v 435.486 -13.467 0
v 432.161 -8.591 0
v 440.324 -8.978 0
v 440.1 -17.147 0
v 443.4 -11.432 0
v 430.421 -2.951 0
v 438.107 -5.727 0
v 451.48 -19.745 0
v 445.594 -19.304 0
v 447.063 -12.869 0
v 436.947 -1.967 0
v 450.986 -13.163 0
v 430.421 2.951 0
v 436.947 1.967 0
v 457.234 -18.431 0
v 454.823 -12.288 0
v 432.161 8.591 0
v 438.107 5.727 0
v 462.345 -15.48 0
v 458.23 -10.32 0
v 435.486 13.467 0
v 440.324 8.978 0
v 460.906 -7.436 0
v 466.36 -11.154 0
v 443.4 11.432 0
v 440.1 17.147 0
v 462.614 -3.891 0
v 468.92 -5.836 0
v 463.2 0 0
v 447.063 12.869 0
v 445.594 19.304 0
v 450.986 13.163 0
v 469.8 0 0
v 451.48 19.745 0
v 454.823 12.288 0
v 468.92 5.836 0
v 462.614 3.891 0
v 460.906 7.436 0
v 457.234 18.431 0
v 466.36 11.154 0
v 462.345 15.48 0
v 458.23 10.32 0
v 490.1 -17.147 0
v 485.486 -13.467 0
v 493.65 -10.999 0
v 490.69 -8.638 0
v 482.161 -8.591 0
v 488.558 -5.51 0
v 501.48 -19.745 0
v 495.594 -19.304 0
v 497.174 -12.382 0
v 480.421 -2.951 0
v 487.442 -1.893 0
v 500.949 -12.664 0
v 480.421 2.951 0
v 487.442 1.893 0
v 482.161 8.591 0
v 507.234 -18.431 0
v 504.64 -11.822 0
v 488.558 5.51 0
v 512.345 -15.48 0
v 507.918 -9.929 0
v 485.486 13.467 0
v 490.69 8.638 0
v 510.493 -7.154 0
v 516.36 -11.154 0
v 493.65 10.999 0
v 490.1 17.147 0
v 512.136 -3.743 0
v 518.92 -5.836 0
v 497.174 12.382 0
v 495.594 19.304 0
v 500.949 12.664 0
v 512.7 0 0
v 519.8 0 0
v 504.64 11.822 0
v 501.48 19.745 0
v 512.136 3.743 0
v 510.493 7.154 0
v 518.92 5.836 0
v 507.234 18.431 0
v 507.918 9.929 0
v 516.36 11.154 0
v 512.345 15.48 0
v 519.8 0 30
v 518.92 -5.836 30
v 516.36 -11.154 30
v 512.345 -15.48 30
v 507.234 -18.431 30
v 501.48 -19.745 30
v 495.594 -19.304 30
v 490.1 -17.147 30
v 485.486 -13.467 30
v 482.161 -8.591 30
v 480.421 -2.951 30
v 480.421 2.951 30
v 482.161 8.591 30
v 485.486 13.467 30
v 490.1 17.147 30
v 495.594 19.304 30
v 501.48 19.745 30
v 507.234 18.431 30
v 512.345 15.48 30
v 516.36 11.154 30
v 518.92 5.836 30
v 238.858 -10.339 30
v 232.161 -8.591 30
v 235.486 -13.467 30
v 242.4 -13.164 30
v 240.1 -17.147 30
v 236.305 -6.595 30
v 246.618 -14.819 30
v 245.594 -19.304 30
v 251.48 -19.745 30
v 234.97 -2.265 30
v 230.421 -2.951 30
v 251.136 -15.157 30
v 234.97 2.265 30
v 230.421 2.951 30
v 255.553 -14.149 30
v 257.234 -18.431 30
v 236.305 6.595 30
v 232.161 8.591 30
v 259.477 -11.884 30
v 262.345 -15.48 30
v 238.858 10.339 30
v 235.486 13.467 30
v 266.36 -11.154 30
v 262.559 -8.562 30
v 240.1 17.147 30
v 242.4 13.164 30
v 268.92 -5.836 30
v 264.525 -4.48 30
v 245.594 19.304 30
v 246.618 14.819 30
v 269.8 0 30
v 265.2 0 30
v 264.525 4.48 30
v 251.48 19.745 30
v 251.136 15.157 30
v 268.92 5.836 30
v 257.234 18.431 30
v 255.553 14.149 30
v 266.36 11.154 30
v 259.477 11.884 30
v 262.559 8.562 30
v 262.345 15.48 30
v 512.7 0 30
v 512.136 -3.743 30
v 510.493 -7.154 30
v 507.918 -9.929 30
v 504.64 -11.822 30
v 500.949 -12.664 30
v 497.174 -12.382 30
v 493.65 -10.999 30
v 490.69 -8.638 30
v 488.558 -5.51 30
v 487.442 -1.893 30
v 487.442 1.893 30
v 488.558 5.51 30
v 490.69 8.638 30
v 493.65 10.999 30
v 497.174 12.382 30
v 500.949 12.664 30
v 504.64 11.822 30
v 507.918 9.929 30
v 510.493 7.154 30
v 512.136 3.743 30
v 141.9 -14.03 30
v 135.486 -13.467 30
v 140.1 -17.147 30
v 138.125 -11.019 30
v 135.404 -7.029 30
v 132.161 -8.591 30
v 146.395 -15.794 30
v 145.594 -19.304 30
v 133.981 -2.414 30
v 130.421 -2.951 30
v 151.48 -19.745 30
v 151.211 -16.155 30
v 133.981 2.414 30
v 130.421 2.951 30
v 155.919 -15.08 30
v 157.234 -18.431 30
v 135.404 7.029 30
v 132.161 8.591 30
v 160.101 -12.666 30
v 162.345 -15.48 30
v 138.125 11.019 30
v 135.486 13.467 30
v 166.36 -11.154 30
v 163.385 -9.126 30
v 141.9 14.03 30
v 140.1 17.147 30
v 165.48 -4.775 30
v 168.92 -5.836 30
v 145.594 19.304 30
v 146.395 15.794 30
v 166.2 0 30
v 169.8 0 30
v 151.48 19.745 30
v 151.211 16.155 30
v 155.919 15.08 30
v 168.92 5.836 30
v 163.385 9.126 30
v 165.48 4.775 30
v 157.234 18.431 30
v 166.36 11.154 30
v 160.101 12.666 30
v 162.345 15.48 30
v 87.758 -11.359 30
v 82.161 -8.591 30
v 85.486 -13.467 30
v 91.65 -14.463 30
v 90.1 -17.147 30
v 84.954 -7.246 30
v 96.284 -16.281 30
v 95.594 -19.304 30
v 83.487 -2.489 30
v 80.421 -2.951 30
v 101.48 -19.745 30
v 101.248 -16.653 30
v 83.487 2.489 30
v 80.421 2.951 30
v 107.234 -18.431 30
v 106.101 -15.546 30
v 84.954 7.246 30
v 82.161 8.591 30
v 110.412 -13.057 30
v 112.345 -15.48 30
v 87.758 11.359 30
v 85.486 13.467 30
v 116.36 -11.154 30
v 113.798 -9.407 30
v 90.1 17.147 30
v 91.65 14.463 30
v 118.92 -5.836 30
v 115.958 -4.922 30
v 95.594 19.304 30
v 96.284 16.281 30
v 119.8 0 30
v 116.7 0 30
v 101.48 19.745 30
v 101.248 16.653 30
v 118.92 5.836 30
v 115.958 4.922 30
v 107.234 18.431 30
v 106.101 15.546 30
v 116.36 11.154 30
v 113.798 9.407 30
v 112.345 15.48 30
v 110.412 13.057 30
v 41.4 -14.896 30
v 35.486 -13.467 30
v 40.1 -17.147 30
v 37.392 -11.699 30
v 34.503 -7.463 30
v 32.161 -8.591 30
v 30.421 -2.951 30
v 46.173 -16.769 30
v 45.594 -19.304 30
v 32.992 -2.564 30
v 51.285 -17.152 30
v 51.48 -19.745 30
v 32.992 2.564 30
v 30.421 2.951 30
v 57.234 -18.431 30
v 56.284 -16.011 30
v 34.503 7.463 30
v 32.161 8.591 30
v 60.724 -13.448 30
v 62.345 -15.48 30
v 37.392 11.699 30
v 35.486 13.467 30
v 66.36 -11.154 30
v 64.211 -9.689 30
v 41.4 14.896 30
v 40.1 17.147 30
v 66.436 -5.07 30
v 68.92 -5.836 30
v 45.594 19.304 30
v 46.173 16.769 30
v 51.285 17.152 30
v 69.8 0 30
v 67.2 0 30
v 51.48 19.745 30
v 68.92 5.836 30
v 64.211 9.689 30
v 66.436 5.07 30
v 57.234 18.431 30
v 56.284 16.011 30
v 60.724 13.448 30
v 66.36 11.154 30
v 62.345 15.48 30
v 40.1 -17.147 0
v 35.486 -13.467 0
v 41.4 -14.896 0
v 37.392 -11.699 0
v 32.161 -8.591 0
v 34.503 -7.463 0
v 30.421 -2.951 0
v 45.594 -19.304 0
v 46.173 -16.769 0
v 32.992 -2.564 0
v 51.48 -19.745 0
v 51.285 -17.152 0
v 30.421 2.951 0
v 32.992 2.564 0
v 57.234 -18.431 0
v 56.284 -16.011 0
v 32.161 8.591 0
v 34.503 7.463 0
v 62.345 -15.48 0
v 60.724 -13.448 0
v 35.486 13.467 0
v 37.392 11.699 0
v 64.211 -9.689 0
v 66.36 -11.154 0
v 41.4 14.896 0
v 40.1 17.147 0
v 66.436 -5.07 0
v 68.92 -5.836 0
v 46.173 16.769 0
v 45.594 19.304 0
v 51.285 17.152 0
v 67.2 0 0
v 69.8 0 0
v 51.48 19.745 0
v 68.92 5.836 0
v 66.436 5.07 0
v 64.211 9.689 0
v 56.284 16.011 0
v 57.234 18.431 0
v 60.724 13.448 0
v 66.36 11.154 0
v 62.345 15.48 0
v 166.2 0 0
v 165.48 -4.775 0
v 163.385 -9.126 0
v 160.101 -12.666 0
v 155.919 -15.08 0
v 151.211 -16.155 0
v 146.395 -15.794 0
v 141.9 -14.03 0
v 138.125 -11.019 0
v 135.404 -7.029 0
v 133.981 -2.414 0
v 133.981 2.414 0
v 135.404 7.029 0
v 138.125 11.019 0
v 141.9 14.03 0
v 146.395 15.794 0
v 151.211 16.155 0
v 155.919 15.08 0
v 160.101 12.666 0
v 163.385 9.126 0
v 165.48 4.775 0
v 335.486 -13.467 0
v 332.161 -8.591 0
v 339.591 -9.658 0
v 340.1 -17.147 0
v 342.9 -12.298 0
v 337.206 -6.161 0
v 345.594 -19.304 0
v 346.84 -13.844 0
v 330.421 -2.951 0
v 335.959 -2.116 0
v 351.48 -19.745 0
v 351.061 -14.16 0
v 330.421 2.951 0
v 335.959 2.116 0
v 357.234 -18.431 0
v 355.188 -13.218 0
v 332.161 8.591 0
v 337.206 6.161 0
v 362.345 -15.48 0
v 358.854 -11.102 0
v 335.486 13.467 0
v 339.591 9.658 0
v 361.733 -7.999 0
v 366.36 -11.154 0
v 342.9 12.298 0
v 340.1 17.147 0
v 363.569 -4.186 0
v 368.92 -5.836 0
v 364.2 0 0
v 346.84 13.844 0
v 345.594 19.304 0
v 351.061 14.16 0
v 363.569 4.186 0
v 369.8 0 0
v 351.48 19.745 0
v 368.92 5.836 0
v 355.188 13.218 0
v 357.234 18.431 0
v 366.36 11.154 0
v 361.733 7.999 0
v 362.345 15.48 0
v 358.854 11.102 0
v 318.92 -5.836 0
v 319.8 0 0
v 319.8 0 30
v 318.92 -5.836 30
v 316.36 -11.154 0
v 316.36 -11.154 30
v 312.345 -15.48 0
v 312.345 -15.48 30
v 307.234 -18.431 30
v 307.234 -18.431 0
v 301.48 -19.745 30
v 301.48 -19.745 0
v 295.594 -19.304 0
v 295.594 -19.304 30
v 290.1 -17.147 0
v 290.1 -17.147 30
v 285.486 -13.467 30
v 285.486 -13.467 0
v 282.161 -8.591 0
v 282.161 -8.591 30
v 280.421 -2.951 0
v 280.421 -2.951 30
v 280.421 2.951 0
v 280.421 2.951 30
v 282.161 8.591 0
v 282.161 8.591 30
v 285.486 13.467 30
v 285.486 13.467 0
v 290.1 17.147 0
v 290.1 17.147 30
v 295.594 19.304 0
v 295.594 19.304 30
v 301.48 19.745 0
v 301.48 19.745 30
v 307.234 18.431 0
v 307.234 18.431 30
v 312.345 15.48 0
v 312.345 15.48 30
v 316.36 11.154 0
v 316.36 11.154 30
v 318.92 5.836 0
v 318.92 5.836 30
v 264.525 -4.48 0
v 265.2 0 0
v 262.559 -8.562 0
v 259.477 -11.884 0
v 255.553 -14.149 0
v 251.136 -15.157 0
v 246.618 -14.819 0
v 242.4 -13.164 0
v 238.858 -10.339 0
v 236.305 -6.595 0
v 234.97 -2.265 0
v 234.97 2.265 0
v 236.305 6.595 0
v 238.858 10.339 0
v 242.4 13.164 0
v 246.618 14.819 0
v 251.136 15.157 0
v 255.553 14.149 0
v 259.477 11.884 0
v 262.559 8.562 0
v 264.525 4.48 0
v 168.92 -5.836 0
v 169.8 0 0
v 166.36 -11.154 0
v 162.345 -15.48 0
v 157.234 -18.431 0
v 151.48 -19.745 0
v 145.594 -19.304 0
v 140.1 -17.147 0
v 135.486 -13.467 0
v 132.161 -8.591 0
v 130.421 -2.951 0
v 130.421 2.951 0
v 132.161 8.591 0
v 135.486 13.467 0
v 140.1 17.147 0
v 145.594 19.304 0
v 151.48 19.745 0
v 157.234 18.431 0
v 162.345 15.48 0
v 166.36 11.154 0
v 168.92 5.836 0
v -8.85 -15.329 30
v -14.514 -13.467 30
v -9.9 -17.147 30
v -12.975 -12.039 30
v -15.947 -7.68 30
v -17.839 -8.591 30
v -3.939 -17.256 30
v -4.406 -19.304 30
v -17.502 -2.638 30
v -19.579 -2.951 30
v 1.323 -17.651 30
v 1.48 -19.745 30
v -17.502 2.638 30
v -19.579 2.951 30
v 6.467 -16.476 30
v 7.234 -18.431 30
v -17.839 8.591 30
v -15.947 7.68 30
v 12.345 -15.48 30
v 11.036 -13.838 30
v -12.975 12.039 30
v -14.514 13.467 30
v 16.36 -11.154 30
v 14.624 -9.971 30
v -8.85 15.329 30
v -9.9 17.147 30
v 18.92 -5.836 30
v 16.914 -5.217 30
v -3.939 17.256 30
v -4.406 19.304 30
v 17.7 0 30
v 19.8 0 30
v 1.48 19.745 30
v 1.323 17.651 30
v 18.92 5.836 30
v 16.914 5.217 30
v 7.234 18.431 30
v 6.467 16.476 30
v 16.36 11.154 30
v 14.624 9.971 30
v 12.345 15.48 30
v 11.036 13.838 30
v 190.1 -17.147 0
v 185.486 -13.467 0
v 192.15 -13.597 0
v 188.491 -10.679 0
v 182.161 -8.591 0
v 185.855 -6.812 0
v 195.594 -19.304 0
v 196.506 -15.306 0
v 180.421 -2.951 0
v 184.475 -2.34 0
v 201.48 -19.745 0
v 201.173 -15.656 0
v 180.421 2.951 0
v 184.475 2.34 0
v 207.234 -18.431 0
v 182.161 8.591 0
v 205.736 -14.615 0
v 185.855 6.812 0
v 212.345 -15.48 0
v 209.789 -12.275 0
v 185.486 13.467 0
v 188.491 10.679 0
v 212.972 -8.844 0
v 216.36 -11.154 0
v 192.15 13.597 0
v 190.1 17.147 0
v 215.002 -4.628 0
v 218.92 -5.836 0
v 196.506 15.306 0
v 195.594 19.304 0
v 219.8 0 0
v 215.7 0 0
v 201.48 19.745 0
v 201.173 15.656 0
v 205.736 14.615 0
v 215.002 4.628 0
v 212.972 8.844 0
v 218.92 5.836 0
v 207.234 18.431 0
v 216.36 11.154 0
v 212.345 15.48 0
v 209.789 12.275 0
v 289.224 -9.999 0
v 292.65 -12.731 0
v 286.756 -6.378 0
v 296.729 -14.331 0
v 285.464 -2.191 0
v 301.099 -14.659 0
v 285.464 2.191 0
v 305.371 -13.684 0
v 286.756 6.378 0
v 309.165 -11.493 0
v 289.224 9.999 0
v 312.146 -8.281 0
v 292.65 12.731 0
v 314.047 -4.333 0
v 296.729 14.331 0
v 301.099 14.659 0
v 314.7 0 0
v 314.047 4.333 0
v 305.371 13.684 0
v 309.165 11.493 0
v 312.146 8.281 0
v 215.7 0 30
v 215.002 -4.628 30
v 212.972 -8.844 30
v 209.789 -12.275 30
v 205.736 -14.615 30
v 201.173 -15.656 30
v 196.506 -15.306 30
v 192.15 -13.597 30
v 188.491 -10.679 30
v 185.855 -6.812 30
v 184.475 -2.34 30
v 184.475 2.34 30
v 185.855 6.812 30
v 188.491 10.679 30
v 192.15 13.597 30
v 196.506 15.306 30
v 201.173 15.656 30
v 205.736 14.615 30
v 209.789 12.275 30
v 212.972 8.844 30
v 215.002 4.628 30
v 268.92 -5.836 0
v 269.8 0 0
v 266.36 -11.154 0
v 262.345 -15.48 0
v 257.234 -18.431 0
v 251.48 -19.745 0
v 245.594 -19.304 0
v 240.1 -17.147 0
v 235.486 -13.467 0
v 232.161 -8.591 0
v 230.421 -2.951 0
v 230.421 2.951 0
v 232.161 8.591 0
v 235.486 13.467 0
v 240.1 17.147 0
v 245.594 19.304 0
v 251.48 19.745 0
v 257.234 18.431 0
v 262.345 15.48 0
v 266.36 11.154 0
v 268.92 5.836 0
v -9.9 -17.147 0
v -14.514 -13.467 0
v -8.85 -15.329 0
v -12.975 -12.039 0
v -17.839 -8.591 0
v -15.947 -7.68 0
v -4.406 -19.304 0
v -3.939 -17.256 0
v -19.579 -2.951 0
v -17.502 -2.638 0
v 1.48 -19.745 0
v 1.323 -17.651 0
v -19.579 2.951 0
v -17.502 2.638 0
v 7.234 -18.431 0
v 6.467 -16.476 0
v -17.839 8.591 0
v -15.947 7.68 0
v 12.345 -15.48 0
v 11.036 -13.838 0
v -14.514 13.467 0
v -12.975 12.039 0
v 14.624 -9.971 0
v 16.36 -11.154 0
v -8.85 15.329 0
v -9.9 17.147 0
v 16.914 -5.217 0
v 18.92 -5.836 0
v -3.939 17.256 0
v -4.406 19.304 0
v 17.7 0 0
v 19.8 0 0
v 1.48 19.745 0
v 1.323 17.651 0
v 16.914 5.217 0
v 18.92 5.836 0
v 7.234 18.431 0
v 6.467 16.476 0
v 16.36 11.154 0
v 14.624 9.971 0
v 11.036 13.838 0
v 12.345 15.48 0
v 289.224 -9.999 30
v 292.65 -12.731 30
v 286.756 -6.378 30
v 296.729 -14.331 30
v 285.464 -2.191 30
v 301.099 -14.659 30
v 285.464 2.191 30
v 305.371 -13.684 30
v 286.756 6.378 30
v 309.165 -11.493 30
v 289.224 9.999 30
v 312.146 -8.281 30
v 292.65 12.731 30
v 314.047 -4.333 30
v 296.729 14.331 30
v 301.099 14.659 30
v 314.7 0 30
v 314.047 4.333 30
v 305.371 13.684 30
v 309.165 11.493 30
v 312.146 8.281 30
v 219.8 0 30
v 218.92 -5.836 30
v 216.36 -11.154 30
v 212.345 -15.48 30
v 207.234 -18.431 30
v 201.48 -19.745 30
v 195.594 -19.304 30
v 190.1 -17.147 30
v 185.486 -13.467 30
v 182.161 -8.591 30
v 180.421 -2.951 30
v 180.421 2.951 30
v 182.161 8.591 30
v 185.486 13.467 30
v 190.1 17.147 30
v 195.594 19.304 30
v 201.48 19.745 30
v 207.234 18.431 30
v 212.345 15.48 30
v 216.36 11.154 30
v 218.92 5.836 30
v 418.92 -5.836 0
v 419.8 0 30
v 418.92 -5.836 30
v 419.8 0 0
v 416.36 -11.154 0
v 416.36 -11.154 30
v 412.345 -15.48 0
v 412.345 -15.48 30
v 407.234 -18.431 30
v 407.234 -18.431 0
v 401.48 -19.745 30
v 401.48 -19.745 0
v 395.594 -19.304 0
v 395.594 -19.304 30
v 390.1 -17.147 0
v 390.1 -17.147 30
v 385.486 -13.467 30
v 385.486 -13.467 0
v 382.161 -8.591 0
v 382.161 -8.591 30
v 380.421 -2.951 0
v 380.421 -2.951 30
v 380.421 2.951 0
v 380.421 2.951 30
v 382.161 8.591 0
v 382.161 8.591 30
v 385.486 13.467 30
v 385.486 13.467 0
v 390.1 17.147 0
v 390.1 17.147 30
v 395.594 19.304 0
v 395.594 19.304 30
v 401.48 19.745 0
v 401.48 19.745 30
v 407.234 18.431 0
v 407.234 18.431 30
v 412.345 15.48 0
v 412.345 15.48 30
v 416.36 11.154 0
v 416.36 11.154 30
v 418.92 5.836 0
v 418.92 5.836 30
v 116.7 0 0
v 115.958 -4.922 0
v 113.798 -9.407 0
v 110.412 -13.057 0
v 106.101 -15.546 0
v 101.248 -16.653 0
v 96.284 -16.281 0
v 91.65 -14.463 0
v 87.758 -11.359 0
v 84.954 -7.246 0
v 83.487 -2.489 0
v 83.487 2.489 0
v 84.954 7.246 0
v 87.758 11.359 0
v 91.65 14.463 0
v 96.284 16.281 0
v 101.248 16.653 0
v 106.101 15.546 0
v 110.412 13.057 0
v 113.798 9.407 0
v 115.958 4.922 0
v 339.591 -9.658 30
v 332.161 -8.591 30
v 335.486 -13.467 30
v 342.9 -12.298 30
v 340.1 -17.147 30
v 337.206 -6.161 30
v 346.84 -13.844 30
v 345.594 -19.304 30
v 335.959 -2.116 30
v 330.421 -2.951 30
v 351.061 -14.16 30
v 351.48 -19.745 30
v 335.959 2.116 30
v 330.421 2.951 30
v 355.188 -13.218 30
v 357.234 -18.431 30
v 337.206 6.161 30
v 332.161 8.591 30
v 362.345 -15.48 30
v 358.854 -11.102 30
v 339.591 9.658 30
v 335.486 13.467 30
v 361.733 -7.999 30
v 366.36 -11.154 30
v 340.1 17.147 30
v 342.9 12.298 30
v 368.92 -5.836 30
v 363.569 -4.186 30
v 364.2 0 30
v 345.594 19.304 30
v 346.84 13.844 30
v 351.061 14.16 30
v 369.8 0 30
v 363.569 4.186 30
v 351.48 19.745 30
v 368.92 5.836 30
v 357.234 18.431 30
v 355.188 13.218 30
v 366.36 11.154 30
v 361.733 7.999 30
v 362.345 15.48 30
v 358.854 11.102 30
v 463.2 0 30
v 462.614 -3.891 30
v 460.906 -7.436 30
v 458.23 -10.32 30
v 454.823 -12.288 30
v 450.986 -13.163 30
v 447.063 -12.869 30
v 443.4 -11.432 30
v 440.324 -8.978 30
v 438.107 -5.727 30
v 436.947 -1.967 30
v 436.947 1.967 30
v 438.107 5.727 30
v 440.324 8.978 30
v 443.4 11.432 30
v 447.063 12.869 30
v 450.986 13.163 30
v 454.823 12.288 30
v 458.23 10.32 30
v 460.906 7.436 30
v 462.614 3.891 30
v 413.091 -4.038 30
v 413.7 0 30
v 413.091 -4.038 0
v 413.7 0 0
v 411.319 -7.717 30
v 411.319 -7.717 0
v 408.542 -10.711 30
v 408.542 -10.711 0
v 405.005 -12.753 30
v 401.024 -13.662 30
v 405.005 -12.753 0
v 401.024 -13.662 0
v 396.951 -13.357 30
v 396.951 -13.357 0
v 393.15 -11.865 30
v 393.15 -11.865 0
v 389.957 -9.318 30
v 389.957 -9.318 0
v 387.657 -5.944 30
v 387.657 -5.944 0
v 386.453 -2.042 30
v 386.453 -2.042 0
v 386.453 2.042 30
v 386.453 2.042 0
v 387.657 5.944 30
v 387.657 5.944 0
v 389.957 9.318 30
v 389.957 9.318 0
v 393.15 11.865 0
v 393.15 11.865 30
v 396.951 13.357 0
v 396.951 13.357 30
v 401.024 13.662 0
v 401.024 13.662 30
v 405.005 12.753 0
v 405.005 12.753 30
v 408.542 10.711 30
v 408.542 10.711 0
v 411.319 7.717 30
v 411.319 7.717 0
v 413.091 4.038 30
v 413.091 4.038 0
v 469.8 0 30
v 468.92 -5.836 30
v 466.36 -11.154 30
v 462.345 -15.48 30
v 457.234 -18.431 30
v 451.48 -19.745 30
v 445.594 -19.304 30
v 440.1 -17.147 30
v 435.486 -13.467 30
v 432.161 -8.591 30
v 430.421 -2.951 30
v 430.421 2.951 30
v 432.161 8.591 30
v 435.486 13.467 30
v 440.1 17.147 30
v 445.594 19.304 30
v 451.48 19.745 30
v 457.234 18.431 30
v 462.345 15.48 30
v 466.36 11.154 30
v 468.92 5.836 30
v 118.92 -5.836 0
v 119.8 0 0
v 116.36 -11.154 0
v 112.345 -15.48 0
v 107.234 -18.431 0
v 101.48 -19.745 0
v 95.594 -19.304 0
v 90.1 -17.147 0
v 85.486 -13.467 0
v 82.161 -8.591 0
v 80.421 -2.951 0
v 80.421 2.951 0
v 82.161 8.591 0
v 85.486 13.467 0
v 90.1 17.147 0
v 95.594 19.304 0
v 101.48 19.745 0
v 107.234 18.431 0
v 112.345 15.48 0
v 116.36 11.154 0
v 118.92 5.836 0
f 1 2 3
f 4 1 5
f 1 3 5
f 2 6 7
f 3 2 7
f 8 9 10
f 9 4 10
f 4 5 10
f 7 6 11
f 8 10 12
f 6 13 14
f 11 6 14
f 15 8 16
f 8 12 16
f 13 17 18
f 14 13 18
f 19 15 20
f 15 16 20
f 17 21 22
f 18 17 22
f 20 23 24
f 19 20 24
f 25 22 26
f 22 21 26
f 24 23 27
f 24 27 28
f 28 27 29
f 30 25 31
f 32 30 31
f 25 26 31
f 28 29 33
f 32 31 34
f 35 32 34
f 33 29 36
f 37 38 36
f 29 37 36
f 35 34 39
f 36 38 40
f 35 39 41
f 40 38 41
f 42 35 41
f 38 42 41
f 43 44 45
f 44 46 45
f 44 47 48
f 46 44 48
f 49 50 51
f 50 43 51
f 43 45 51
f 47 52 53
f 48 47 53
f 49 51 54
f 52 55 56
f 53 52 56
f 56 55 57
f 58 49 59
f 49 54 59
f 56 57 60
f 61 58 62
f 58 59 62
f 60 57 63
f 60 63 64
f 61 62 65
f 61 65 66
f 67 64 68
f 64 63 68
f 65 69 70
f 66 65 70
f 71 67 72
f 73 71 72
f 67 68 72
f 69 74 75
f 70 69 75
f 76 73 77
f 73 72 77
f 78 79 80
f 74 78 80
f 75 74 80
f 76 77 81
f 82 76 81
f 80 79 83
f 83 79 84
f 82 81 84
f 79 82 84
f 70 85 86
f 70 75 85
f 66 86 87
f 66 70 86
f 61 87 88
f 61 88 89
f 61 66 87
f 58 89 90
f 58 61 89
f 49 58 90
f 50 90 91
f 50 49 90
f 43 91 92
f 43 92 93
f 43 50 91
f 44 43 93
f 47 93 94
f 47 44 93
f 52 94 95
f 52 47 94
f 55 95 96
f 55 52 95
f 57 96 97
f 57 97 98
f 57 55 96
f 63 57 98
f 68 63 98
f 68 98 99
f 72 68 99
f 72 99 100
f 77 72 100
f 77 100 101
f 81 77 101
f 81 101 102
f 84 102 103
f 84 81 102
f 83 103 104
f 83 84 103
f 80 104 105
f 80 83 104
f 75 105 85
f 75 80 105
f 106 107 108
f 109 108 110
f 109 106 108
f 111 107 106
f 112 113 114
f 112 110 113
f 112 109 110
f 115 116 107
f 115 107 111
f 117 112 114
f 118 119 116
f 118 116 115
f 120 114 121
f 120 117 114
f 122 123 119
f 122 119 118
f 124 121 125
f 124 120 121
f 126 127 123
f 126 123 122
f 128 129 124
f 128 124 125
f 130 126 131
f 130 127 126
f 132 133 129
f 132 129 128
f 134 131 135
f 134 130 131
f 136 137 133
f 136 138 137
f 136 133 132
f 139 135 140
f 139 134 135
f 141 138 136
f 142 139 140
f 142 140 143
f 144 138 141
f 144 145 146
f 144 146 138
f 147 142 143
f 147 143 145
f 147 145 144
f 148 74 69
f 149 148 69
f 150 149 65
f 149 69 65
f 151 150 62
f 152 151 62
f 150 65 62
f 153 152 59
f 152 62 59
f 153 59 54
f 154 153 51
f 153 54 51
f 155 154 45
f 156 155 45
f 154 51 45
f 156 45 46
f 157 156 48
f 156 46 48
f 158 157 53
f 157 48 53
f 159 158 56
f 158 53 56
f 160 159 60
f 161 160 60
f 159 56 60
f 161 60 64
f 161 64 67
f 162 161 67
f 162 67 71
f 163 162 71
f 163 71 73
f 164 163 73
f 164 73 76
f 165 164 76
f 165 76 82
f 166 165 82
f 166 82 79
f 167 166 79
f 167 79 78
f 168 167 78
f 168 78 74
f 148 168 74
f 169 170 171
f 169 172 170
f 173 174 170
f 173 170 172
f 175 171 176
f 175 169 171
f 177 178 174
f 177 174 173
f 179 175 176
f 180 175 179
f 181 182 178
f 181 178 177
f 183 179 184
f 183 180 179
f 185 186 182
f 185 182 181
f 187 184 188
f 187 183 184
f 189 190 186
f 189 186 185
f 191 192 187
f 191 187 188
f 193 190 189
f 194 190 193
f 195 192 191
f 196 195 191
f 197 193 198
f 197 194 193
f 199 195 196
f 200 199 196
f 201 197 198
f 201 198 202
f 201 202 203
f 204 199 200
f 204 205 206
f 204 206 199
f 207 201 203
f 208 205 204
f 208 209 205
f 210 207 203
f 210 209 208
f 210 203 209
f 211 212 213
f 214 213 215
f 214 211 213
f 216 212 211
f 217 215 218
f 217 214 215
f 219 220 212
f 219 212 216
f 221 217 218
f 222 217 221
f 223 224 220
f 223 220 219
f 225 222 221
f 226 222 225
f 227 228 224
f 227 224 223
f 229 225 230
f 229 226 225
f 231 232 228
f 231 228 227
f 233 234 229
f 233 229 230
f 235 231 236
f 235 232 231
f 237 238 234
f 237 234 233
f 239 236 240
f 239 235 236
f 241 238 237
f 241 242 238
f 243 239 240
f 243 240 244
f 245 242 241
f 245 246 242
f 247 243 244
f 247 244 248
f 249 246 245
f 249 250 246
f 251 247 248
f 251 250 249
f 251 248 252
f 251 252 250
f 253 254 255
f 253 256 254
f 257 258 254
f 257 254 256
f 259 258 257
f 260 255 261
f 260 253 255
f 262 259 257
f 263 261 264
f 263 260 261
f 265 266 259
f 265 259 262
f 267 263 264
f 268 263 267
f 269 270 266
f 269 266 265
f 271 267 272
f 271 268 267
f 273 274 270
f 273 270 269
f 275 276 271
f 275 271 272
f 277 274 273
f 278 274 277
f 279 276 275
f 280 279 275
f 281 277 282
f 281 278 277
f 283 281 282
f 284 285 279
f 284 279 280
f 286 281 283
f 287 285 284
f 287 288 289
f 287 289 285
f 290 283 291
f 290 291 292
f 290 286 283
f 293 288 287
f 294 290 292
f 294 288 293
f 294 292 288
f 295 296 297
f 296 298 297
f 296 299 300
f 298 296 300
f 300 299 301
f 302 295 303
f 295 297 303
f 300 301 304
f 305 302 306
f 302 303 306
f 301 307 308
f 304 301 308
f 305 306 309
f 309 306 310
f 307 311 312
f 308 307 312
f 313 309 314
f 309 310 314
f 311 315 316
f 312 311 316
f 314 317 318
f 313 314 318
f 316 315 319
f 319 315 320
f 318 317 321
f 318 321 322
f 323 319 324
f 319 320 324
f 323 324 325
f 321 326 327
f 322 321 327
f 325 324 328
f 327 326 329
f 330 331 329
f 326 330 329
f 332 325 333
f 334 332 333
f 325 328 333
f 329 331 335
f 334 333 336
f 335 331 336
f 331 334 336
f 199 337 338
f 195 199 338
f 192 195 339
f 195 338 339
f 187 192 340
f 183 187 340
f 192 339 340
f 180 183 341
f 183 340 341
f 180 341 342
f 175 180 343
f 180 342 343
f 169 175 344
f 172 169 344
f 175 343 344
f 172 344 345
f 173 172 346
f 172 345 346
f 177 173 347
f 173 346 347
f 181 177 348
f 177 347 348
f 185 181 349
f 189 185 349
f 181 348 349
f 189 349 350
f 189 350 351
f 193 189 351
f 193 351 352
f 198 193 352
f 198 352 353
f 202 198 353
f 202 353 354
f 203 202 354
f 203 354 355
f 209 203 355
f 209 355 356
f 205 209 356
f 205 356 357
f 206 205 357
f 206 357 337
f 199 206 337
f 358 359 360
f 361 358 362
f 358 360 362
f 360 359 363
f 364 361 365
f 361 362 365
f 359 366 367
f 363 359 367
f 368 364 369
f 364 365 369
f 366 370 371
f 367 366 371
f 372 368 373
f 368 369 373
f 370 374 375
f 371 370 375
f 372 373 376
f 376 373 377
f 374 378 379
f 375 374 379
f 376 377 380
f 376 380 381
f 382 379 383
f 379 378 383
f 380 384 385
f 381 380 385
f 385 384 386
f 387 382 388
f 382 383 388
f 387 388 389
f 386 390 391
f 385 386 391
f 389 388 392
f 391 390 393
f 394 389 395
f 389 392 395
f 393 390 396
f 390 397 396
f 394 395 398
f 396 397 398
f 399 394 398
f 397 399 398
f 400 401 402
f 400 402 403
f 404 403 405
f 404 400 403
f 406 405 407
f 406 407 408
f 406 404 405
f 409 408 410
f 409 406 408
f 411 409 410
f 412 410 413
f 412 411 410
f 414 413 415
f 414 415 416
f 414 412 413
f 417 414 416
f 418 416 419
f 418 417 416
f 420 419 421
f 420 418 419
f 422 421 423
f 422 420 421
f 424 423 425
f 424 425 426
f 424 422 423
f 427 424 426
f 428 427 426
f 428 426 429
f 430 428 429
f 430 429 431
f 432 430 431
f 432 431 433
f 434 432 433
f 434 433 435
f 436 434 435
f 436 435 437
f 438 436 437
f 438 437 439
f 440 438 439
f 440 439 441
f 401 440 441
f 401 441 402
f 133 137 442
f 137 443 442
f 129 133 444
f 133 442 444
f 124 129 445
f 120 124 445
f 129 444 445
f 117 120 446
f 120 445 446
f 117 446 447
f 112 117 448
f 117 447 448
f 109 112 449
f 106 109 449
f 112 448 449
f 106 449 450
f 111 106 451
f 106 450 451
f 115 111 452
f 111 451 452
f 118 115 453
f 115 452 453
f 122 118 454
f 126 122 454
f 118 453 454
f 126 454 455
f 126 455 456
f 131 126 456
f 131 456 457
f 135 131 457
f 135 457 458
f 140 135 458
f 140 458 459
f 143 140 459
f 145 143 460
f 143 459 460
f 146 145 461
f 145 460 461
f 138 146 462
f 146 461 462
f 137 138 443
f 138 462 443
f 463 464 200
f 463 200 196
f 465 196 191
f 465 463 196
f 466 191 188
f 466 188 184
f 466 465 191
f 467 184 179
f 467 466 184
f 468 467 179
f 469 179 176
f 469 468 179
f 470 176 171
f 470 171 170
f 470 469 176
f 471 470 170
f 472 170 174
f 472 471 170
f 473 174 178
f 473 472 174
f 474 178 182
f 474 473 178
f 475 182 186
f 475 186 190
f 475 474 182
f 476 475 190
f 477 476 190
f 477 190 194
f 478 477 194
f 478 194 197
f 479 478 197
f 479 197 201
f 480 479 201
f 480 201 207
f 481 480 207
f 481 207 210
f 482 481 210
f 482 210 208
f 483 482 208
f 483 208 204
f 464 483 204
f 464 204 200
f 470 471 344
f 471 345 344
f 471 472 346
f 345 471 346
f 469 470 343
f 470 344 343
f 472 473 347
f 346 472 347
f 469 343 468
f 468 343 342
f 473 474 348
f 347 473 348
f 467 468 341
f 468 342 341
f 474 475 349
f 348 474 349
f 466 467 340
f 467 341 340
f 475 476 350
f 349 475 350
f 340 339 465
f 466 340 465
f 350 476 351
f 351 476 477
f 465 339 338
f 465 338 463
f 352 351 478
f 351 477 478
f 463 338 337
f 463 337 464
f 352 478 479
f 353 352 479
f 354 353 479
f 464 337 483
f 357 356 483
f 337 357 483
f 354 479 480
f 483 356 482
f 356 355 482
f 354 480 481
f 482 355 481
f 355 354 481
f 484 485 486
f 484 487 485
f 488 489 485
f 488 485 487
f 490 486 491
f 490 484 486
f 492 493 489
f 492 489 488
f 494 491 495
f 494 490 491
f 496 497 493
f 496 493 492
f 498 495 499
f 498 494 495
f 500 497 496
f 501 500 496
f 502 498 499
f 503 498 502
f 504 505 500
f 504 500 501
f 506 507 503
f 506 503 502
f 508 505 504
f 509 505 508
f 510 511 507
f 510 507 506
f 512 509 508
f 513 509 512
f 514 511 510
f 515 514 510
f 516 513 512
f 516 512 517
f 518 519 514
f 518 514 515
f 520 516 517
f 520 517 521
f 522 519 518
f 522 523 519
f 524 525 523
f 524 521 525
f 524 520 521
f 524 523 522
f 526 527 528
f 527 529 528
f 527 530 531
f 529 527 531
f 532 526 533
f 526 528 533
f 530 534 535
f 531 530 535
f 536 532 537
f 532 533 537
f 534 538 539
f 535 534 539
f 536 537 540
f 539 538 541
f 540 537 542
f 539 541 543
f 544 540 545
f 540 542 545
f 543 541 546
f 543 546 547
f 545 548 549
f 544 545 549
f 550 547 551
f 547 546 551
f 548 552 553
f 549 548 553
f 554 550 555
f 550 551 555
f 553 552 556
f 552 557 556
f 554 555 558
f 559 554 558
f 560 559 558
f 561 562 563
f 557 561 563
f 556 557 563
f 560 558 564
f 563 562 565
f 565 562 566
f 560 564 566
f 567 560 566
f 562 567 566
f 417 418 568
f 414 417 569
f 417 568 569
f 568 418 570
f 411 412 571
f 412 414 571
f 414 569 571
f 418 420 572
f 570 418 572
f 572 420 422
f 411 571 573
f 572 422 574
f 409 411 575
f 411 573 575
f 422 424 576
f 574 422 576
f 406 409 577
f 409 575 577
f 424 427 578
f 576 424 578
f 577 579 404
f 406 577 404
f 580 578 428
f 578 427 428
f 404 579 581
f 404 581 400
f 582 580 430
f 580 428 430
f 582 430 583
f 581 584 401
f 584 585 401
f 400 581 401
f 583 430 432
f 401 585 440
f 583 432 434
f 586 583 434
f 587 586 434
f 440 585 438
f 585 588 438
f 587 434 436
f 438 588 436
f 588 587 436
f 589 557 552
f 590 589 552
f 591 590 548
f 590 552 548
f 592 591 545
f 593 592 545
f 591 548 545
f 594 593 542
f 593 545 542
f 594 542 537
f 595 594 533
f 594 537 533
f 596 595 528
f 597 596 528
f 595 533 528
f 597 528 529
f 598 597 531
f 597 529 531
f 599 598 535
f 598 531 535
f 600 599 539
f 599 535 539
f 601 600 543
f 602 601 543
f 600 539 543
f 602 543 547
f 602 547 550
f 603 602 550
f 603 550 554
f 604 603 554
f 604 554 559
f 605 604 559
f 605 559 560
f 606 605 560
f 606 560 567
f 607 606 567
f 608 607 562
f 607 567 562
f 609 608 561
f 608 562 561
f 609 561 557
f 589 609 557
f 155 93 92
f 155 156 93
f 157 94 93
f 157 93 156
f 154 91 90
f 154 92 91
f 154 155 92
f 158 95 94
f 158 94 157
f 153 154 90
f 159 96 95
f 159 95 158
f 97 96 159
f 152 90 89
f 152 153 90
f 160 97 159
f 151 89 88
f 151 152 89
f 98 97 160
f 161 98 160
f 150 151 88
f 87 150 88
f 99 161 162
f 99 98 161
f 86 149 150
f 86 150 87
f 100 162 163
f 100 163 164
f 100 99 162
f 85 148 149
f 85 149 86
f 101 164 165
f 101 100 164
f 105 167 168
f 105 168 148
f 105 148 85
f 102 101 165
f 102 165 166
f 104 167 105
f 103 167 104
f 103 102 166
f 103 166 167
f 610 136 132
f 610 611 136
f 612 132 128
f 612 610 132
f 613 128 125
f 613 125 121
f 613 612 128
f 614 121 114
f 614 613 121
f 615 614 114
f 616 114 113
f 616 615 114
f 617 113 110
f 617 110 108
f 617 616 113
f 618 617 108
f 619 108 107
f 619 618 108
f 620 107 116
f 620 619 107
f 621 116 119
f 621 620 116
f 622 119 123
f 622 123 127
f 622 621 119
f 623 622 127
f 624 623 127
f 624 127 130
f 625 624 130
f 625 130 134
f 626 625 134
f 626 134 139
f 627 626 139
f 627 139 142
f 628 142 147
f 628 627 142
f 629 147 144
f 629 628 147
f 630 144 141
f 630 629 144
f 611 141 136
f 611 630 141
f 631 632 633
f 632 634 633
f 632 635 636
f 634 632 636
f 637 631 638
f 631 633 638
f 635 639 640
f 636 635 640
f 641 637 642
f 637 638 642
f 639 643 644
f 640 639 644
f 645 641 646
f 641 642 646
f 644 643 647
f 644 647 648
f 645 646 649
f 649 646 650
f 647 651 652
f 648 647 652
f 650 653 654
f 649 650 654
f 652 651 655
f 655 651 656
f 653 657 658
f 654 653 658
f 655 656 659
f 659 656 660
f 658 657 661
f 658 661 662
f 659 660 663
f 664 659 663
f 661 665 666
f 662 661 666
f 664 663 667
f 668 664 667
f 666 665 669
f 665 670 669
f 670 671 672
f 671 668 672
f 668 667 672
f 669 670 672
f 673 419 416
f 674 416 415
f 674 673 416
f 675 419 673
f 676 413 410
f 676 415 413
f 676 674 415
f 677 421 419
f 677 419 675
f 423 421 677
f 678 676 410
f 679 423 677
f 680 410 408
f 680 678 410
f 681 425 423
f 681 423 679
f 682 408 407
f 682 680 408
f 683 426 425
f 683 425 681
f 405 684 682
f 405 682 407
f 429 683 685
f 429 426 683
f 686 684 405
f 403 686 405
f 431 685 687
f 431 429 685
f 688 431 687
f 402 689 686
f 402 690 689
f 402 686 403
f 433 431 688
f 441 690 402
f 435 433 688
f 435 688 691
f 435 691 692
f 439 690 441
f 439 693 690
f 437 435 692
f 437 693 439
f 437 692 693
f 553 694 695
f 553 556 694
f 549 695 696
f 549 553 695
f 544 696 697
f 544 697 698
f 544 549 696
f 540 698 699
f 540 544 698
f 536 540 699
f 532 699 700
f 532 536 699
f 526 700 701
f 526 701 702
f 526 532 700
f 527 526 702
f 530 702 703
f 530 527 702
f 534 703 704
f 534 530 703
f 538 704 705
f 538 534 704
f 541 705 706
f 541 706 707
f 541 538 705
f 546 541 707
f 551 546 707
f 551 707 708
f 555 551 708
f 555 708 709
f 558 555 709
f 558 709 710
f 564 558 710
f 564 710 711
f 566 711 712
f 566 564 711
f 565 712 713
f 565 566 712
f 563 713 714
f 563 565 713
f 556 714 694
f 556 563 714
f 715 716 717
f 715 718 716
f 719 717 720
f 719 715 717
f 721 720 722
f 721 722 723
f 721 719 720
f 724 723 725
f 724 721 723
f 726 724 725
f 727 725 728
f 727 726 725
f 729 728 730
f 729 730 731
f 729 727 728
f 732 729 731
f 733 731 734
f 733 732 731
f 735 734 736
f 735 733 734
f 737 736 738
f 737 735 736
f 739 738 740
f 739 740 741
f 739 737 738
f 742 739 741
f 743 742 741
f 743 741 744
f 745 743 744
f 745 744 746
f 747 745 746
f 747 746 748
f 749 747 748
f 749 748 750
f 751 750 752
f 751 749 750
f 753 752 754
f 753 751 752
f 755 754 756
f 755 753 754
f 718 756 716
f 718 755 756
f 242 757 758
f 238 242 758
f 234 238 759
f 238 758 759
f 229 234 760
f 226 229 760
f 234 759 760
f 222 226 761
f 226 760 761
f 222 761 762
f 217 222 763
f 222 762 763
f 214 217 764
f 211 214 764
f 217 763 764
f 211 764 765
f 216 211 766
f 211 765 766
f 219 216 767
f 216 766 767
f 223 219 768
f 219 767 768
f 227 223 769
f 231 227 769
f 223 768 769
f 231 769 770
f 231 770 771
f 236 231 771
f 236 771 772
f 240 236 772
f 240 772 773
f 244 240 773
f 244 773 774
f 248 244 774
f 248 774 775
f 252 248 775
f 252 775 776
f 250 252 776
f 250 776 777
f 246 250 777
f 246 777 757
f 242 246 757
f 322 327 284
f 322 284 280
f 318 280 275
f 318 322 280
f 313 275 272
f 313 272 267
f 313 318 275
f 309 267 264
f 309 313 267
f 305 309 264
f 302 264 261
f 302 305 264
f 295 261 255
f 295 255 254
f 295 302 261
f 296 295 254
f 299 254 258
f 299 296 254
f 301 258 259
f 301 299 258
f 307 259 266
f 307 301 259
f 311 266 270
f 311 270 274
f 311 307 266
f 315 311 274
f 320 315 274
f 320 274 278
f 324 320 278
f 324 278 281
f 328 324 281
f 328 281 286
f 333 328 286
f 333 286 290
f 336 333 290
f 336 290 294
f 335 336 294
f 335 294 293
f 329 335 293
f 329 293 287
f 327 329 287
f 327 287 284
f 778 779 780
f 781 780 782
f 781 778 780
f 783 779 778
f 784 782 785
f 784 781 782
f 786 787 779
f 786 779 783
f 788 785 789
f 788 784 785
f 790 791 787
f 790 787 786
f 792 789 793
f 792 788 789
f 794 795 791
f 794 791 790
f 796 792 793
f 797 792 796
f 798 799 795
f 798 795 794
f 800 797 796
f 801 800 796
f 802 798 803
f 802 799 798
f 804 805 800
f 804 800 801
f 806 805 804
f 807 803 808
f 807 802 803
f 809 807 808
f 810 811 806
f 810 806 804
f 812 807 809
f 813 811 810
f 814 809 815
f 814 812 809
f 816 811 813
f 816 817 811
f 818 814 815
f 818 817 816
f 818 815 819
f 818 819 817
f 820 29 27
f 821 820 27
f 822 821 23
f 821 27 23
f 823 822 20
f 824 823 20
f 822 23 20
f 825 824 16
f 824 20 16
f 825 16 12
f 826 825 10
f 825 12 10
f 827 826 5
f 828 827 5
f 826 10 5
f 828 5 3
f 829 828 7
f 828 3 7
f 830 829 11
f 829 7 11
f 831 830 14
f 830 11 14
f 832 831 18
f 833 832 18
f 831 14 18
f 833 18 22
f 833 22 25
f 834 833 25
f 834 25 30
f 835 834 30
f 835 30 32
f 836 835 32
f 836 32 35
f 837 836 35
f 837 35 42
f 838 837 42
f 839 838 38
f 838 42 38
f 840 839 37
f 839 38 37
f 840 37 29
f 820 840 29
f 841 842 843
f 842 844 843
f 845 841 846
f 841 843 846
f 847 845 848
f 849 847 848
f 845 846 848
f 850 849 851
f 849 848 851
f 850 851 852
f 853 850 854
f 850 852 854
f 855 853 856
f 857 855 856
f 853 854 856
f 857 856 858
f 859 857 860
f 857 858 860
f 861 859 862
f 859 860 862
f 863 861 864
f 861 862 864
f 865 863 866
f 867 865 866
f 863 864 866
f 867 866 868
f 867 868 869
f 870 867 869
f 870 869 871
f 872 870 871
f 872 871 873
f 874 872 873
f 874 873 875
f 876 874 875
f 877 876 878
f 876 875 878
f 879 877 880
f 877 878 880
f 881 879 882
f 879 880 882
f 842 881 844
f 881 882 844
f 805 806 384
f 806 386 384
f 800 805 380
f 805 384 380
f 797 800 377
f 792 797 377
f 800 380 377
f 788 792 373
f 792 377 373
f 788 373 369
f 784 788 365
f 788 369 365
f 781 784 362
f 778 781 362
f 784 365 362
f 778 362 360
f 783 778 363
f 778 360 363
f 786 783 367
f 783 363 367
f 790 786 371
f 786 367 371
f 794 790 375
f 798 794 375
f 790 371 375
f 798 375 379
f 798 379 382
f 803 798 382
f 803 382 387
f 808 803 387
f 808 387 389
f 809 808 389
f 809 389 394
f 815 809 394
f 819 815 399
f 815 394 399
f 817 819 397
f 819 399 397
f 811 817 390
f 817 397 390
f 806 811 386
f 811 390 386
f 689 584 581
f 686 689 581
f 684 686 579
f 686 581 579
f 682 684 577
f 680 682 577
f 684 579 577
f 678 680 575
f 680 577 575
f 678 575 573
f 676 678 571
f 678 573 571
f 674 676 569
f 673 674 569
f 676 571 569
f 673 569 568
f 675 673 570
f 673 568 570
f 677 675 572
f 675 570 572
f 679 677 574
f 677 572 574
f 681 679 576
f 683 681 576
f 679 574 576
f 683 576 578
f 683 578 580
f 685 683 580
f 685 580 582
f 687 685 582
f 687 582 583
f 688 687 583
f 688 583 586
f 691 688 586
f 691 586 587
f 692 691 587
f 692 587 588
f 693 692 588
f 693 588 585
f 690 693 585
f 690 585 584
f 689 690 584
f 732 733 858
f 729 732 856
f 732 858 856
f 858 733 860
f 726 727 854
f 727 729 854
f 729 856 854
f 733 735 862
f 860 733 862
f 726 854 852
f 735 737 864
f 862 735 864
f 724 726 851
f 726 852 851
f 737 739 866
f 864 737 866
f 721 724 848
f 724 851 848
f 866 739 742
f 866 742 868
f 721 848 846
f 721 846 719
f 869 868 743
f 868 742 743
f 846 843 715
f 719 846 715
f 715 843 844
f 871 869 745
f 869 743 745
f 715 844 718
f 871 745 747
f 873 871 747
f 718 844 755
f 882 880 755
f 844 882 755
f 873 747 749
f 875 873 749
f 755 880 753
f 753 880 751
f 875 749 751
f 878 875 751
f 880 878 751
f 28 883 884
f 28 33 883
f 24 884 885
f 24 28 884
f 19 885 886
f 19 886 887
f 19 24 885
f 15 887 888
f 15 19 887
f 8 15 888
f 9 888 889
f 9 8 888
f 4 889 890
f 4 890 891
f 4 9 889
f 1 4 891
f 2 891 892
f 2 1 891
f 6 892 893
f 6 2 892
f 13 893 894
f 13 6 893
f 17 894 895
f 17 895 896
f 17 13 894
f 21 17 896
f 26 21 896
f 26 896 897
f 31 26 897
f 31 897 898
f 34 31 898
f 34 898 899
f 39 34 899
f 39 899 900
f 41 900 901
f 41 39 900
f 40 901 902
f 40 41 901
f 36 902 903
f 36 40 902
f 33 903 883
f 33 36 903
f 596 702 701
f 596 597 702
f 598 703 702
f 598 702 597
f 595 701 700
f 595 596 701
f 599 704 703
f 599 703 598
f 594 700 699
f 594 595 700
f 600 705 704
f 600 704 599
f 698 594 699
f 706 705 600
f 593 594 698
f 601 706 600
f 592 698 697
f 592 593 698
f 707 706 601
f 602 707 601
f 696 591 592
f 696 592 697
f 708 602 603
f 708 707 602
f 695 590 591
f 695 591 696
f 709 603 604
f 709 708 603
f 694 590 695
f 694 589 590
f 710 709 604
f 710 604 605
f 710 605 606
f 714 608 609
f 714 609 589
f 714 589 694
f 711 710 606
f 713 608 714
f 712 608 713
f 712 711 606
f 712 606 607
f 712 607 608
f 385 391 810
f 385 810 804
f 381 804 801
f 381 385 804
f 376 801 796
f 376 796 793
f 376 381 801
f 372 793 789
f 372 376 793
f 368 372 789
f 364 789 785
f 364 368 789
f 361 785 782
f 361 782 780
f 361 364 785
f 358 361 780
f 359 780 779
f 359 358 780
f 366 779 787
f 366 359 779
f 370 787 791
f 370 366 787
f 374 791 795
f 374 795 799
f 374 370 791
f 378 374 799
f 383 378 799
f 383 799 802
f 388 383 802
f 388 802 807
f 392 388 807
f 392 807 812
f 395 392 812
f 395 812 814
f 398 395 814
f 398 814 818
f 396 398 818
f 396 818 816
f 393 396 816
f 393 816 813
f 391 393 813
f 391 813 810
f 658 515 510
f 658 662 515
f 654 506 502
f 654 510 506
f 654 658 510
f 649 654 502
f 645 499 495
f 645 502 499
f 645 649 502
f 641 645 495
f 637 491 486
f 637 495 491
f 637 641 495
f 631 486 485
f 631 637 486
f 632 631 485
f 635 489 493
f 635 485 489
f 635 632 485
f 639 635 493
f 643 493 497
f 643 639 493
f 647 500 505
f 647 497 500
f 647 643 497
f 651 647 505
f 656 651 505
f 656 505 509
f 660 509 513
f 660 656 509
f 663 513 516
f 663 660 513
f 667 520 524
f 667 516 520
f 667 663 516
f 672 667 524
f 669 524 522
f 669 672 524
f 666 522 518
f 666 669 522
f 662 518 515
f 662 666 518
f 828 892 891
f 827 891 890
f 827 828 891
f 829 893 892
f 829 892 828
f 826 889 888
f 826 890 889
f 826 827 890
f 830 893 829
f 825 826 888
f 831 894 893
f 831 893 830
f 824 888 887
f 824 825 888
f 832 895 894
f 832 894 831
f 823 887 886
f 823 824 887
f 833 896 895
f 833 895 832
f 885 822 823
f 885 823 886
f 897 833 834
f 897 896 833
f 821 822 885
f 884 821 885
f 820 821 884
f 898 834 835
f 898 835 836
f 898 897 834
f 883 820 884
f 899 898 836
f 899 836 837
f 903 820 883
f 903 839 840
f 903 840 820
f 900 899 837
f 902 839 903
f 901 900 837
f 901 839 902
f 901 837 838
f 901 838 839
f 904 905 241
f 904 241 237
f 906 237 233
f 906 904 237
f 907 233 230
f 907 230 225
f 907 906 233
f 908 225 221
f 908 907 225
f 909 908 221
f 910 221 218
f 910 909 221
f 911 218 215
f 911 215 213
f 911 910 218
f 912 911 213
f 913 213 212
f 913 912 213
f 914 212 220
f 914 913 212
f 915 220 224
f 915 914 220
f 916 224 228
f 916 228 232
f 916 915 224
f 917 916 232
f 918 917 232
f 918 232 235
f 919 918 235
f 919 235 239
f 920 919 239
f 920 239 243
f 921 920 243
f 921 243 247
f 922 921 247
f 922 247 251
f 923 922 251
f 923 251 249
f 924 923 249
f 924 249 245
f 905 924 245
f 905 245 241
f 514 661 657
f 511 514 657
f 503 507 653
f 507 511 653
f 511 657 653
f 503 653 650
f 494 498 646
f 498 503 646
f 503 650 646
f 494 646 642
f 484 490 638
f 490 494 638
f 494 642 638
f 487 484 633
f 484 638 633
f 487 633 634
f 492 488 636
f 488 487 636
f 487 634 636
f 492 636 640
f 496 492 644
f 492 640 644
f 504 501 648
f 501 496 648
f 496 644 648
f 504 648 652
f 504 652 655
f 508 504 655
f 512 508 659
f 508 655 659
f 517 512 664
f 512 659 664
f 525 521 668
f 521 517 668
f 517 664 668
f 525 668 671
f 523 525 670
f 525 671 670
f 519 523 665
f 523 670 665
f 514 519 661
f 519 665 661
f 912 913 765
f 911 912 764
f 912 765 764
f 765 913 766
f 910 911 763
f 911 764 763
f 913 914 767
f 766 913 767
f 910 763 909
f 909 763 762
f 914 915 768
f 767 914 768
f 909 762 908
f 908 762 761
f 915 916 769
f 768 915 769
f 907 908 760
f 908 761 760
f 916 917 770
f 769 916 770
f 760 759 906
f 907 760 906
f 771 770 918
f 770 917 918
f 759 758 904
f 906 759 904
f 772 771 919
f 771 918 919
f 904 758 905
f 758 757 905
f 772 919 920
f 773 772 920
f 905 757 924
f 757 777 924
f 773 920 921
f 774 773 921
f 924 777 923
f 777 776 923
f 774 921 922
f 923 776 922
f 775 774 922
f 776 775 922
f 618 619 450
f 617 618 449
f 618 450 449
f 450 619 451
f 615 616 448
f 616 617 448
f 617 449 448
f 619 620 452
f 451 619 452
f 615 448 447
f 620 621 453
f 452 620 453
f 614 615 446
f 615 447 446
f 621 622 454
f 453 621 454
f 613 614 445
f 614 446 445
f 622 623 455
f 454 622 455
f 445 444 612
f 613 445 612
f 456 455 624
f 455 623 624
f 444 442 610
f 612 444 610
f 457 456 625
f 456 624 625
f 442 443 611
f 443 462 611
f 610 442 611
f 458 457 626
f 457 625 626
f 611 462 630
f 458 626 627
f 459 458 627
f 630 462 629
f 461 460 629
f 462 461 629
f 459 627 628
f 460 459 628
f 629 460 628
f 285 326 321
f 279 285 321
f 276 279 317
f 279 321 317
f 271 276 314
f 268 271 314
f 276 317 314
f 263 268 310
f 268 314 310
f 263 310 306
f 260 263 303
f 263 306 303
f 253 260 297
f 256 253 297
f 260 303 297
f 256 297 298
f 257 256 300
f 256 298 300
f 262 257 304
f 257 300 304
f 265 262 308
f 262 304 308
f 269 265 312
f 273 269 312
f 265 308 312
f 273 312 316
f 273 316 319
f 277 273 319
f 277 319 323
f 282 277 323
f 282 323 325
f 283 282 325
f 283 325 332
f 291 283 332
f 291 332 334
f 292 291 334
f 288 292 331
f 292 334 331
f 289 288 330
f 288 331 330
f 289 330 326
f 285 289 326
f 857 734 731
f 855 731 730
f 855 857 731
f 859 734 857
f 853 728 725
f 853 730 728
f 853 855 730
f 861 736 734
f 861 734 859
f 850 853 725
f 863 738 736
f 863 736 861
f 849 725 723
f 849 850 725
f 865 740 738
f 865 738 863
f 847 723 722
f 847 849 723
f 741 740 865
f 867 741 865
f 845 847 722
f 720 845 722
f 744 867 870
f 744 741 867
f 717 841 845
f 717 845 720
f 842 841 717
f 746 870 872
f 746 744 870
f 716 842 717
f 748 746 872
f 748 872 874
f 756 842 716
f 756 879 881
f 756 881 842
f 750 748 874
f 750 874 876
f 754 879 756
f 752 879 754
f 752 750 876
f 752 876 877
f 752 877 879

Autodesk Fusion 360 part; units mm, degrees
sketch "Schizzo1" plane through (0, 0, 0) normal (0, 0, 1) x (1, 0, 0)
  circle A0 centre (0, 0) radius 17.7
  circle A1 centre (0, 0) radius 19.8
  dimension "d2" = 39.6
  dimension "d23" = 35.4
extrude "Estrusione1" add sketch "Schizzo1" along normal blind 30 makes body 1
pattern_linear "Serie R1" count 11 spacing 50 along (1, 0, 0) of bodies 1 makes body 2 at (69.7016, -1.9714, 20) makes body 3 at (119.7016, -1.9714, 20) makes body 4 at (169.7016, -1.9714, 20) makes body 5 at (219.7016, -1.9714, 20) makes body 6 at (269.7016, -1.9714, 20) makes body 7 at (319.7016, -1.9714, 20) makes body 8 at (369.7016, -1.9714, 20) makes body 9 at (419.7016, -1.9714, 20) makes body 10 at (469.7016, -1.9714, 20) makes body 11 at (510.7424, 16.6325, 20)
move_face "FacceDiOffset2" offset 0.5 1 faces at (67.612, -1.7624, 20) on bodies 2
move_face "FacceDiOffset3" offset 1 1 faces at (117.612, -1.7624, 20) on bodies 3
move_face "FacceDiOffset4" offset 1.5 1 faces at (167.612, -1.7624, 20) on bodies 4
move_face "FacceDiOffset5" offset 2 1 faces at (217.612, -1.7624, 20) on bodies 5
move_face "FacceDiOffset6" offset 2.5 1 faces at (267.612, -1.7624, 20) on bodies 6
move_face "FacceDiOffset7" offset 3 1 faces at (317.612, -1.7624, 20) on bodies 7
move_face "FacceDiOffset8" offset 3.5 1 faces at (367.612, -1.7624, 20) on bodies 8
move_face "FacceDiOffset9" offset 4 1 faces at (417.612, -1.7624, 20) on bodies 9
move_face "FacceDiOffset10" offset 4.5 1 faces at (467.612, -1.7624, 20) on bodies 10
move_face "FacceDiOffset11" offset 5 1 faces at (517.612, -1.7624, 20) on bodies 11
equation "Step = 1 mm"
equation "d13 = Step / 2 * 1"
equation "d14 = Step / 2 * 2"
equation "d15 = Step / 2 * 3"
equation "d16 = Step / 2 * 4"
equation "d17 = Step / 2 * 5"
equation "d18 = Step / 2 * 6"
equation "d19 = Step / 2 * 7"
equation "d20 = Step / 2 * 8"
equation "d21 = Step / 2 * 9"
equation "d22 = Step / 2 * 10"
equation "Start = 35.40 mm"
